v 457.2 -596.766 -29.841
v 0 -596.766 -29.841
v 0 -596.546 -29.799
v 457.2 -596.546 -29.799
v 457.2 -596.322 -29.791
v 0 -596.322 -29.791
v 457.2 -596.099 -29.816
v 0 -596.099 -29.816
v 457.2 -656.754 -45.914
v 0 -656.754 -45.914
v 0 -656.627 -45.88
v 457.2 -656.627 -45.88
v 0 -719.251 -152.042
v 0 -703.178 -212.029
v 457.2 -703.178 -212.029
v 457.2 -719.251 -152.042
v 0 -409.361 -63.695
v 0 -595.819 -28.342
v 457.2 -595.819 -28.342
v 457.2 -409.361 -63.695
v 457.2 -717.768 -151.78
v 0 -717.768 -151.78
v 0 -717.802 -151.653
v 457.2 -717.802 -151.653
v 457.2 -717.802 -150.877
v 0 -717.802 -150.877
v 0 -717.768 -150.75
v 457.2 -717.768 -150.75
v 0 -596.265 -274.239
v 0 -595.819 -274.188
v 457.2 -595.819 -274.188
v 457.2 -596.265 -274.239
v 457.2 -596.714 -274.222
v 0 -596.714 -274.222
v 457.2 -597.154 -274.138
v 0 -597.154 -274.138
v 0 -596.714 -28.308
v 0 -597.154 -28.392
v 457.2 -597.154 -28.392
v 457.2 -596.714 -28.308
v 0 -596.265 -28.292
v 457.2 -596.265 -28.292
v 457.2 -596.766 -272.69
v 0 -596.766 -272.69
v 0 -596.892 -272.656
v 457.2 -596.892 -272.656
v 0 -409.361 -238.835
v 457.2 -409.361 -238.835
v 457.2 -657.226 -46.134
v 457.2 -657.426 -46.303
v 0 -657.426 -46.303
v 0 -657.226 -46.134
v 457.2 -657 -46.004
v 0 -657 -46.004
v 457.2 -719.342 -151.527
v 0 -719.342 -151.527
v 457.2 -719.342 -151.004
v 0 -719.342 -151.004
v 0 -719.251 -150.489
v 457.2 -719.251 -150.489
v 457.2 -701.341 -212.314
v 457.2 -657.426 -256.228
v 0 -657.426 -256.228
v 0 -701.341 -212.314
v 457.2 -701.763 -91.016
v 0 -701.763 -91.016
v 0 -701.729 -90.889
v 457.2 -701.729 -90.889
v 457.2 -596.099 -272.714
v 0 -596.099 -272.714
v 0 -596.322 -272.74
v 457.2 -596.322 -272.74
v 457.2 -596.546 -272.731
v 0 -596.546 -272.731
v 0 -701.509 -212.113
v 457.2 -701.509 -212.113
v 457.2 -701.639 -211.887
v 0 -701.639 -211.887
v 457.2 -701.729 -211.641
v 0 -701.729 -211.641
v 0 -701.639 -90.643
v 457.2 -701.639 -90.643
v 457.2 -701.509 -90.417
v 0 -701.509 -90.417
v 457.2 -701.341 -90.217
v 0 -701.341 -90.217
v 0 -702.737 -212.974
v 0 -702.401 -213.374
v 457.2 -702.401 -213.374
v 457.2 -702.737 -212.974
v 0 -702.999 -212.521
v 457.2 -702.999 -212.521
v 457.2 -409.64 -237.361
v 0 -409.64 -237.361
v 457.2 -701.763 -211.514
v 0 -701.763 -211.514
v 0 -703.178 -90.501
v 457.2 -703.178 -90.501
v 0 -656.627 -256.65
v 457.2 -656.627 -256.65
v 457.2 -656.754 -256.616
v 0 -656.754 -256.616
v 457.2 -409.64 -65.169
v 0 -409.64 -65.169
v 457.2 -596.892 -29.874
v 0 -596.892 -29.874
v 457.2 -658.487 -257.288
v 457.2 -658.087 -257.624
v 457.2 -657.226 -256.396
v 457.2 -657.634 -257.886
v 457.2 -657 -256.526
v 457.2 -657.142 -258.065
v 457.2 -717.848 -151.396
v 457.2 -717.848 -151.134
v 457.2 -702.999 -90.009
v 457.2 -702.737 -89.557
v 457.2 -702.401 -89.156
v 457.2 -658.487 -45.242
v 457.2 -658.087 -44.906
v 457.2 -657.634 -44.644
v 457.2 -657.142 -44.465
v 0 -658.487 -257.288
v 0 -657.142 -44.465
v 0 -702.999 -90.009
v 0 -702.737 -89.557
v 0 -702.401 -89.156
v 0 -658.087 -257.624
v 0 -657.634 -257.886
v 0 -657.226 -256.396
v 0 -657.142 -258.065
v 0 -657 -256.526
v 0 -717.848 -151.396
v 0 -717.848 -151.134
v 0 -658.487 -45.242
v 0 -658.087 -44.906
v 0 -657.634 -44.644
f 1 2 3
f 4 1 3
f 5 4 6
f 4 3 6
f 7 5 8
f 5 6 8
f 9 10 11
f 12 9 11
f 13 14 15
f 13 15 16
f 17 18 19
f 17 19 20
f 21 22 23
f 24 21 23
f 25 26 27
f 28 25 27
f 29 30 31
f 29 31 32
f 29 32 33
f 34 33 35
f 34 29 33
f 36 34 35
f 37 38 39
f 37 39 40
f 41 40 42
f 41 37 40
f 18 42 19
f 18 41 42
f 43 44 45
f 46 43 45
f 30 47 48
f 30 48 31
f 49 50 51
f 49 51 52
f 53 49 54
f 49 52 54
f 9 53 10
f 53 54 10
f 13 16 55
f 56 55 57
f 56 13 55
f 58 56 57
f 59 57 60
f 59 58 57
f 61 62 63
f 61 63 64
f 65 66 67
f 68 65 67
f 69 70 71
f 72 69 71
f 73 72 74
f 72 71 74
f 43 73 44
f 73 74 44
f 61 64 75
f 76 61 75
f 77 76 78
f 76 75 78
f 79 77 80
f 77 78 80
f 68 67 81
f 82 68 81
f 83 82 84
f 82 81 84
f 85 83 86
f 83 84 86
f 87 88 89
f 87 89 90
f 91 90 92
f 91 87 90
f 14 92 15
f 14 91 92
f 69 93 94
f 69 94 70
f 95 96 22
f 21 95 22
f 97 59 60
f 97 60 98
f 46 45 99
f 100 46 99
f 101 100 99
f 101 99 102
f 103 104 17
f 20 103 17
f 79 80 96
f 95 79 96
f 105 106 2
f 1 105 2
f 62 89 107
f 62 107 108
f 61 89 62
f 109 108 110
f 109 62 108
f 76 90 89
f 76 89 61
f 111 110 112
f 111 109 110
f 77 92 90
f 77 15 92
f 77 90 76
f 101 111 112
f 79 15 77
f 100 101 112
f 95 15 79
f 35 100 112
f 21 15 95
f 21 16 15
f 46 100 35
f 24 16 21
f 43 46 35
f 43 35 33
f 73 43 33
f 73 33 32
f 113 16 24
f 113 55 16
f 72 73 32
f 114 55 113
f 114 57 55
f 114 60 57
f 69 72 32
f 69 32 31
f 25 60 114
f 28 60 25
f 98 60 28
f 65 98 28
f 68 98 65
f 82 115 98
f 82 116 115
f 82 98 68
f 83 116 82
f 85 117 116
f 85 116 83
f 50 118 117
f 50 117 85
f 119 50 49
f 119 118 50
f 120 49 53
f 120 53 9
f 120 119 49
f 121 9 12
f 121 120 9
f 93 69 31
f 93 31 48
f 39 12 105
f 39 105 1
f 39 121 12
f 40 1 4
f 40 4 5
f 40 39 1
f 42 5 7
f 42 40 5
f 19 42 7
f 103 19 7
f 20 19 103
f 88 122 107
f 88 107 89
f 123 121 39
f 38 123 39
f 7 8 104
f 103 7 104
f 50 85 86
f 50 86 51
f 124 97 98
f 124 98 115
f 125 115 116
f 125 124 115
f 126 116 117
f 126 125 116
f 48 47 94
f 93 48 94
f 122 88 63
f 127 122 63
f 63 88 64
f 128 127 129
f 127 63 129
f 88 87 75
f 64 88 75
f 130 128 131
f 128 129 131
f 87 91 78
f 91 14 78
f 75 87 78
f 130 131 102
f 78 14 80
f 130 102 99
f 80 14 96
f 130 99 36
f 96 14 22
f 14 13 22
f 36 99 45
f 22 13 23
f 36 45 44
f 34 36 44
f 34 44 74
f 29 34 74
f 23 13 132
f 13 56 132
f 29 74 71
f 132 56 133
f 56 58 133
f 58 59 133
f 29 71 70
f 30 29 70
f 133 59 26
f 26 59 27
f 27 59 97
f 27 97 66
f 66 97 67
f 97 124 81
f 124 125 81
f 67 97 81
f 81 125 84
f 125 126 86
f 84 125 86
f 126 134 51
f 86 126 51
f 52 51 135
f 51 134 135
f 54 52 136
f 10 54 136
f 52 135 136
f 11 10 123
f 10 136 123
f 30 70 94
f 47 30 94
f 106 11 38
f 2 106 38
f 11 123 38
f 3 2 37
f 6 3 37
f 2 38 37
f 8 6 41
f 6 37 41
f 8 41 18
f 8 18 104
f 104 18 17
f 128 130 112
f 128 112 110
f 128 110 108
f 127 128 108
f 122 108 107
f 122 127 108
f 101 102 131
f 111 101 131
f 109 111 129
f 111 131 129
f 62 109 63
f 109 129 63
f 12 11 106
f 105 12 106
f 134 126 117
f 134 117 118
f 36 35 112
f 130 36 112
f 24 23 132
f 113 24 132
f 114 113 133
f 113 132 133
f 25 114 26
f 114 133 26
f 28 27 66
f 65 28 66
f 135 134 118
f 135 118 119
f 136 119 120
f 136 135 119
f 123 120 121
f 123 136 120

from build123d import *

# Parameters (mm, degrees)
BOSS_EXTRUDE1_DEPTH    = 457.2
CONVERT_SOLID1_DEPTH   = 457.2
CONVERT_SOLID1_2_DEPTH = 457.2


# Read off the part's stored shape, not the designer's step: Convert-Solid1
with BuildPart() as part:
    # Sketch1 → Boss-Extrude1 (new body)
    with BuildSketch(Plane(origin=(0, 0, 0), x_dir=(0, 0, 1), z_dir=(1, 0, 0))):
        Polygon((-29.751953414, 596.435252585), (-65.16880823, 409.640335681), (-63.546707453, 409.332780696), (-28.059593886, 596.498254998), (-28.279614725, 597.319383946), (-44.285546712, 657.054335345), (-44.538099225, 657.996874156), (-45.228085523, 658.686860454), (-88.95625047, 702.415025401), (-89.646236768, 703.105011699), (-90.588775579, 703.357564213), (-150.322559758, 719.363183444), (-151.265098569, 719.615735957), (-152.20763738, 719.363183444), (-211.941421559, 703.357564213), (-212.88396037, 703.105011699), (-213.573946668, 702.415025401), (-257.302111615, 658.686860454), (-257.992097913, 657.996874156), (-258.244650426, 657.054335345), (-274.250582413, 597.319383946), (-274.470603252, 596.498254998), (-238.983489685, 409.332780696), (-237.361388908, 409.640335681), (-272.778243724, 596.435252585), (-272.655838874, 596.892073703), (-256.649906887, 656.627025102), (-256.511851808, 657.14225367), (-256.134678319, 657.519427159), (-212.406513372, 701.247592106), (-212.029339883, 701.624765595), (-211.514111315, 701.762820673), (-151.780327137, 717.768439905), (-151.265098569, 717.906494983), (-150.749870001, 717.768439905), (-91.016085823, 701.762820673), (-90.500857255, 701.624765595), (-90.123683766, 701.247592106), (-46.395518819, 657.519427159), (-46.01834533, 657.14225367), (-45.880290251, 656.627025102), (-29.874358264, 596.892073703), align=None)
    extrude(amount=BOSS_EXTRUDE1_DEPTH)

    # Convert-Solid1 outline → Convert-Solid1 (cut)
    with BuildSketch(Plane.YZ):
        with BuildLine():
            Line((-409.332780696, -238.983489685), (-409.360909589, -238.8351328))
            Line((-409.360909589, -238.8351328), (-595.819160173, -274.188154711))
            ThreePointArc((-595.819160173, -274.188154711), (-596.489617721, -274.238590248), (-597.154469491, -274.138444405))
            Line((-597.154469491, -274.138444405), (-657.14225367, -258.064766079))
            ThreePointArc((-657.14225367, -258.064766079), (-657.865796534, -257.765064811), (-658.487116878, -257.288308944))
            Line((-658.487116878, -257.288308944), (-702.40122273, -213.374203091))
            ThreePointArc((-702.40122273, -213.374203091), (-702.877978598, -212.752882748), (-703.177679865, -212.029339883))
            Line((-703.177679865, -212.029339883), (-719.251358192, -152.041555704))
            ThreePointArc((-719.251358192, -152.041555704), (-719.353580713, -151.265098569), (-719.251358192, -150.488641434))
            Line((-719.251358192, -150.488641434), (-703.177679865, -90.500857255))
            ThreePointArc((-703.177679865, -90.500857255), (-702.877978598, -89.77731439), (-702.40122273, -89.155994047))
            Line((-702.40122273, -89.155994047), (-658.487116878, -45.241888194))
            ThreePointArc((-658.487116878, -45.241888194), (-657.865796534, -44.765132327), (-657.14225367, -44.465431059))
            Line((-657.14225367, -44.465431059), (-597.154469491, -28.391752733))
            ThreePointArc((-597.154469491, -28.391752733), (-596.489617721, -28.29160689), (-595.819160173, -28.342042427))
            Line((-595.819160173, -28.342042427), (-409.360909589, -63.695064338))
            Line((-409.360909589, -63.695064338), (-409.332780696, -63.546707453))
            Line((-409.332780696, -63.546707453), (-596.498254998, -28.059593886))
            Line((-596.498254998, -28.059593886), (-657.996874156, -44.538099225))
            Line((-657.996874156, -44.538099225), (-703.105011699, -89.646236768))
            Line((-703.105011699, -89.646236768), (-719.615735957, -151.265098569))
            Line((-719.615735957, -151.265098569), (-703.105011699, -212.88396037))
            Line((-703.105011699, -212.88396037), (-657.996874156, -257.992097913))
            Line((-657.996874156, -257.992097913), (-596.498254998, -274.470603252))
            Line((-596.498254998, -274.470603252), (-409.332780696, -238.983489685))
        make_face()
    extrude(amount=CONVERT_SOLID1_DEPTH, mode=Mode.SUBTRACT)

    # Convert-Solid1 2 outline → Convert-Solid1 2 (add)
    with BuildSketch(Plane.YZ):
        with BuildLine():
            ThreePointArc((-596.098586265, -272.714410818), (-596.433815038, -272.739628587), (-596.766240923, -272.689555666))
            Line((-596.766240923, -272.689555666), (-596.435252585, -272.778243724))
            Line((-596.435252585, -272.778243724), (-596.098586265, -272.714410818))
        make_face()
        with BuildLine():
            Line((-657.14225367, -256.511851808), (-656.754025102, -256.615877339))
            ThreePointArc((-656.754025102, -256.615877339), (-657.115796534, -256.466026706), (-657.426456706, -256.227648772))
            Line((-657.426456706, -256.227648772), (-657.14225367, -256.511851808))
        make_face()
        with BuildLine():
            Line((-701.624765595, -212.029339883), (-701.340562558, -212.313542919))
            ThreePointArc((-701.340562558, -212.313542919), (-701.578940492, -212.002882747), (-701.728791126, -211.641111315))
            Line((-701.728791126, -211.641111315), (-701.624765595, -212.029339883))
        make_face()
        with BuildLine():
            Line((-717.906494983, -151.265098569), (-717.802469452, -151.653327137))
            ThreePointArc((-717.802469452, -151.653327137), (-717.853580713, -151.265098569), (-717.802469452, -150.876870001))
            Line((-717.802469452, -150.876870001), (-717.906494983, -151.265098569))
        make_face()
        with BuildLine():
            Line((-701.624765595, -90.500857255), (-701.728791126, -90.889085823))
            ThreePointArc((-701.728791126, -90.889085823), (-701.578940492, -90.527314391), (-701.340562558, -90.216654219))
            Line((-701.340562558, -90.216654219), (-701.624765595, -90.500857255))
        make_face()
        with BuildLine():
            Line((-657.14225367, -46.01834533), (-657.426456706, -46.302548366))
            ThreePointArc((-657.426456706, -46.302548366), (-657.115796534, -46.064170432), (-656.754025102, -45.914319799))
            Line((-656.754025102, -45.914319799), (-657.14225367, -46.01834533))
        make_face()
        with BuildLine():
            Line((-596.435252585, -29.751953414), (-596.766240923, -29.840641472))
            ThreePointArc((-596.766240923, -29.840641472), (-596.433815038, -29.790568551), (-596.098586265, -29.815786319))
            Line((-596.098586265, -29.815786319), (-596.435252585, -29.751953414))
        make_face()
    extrude(amount=CONVERT_SOLID1_2_DEPTH)


solid = part.part
